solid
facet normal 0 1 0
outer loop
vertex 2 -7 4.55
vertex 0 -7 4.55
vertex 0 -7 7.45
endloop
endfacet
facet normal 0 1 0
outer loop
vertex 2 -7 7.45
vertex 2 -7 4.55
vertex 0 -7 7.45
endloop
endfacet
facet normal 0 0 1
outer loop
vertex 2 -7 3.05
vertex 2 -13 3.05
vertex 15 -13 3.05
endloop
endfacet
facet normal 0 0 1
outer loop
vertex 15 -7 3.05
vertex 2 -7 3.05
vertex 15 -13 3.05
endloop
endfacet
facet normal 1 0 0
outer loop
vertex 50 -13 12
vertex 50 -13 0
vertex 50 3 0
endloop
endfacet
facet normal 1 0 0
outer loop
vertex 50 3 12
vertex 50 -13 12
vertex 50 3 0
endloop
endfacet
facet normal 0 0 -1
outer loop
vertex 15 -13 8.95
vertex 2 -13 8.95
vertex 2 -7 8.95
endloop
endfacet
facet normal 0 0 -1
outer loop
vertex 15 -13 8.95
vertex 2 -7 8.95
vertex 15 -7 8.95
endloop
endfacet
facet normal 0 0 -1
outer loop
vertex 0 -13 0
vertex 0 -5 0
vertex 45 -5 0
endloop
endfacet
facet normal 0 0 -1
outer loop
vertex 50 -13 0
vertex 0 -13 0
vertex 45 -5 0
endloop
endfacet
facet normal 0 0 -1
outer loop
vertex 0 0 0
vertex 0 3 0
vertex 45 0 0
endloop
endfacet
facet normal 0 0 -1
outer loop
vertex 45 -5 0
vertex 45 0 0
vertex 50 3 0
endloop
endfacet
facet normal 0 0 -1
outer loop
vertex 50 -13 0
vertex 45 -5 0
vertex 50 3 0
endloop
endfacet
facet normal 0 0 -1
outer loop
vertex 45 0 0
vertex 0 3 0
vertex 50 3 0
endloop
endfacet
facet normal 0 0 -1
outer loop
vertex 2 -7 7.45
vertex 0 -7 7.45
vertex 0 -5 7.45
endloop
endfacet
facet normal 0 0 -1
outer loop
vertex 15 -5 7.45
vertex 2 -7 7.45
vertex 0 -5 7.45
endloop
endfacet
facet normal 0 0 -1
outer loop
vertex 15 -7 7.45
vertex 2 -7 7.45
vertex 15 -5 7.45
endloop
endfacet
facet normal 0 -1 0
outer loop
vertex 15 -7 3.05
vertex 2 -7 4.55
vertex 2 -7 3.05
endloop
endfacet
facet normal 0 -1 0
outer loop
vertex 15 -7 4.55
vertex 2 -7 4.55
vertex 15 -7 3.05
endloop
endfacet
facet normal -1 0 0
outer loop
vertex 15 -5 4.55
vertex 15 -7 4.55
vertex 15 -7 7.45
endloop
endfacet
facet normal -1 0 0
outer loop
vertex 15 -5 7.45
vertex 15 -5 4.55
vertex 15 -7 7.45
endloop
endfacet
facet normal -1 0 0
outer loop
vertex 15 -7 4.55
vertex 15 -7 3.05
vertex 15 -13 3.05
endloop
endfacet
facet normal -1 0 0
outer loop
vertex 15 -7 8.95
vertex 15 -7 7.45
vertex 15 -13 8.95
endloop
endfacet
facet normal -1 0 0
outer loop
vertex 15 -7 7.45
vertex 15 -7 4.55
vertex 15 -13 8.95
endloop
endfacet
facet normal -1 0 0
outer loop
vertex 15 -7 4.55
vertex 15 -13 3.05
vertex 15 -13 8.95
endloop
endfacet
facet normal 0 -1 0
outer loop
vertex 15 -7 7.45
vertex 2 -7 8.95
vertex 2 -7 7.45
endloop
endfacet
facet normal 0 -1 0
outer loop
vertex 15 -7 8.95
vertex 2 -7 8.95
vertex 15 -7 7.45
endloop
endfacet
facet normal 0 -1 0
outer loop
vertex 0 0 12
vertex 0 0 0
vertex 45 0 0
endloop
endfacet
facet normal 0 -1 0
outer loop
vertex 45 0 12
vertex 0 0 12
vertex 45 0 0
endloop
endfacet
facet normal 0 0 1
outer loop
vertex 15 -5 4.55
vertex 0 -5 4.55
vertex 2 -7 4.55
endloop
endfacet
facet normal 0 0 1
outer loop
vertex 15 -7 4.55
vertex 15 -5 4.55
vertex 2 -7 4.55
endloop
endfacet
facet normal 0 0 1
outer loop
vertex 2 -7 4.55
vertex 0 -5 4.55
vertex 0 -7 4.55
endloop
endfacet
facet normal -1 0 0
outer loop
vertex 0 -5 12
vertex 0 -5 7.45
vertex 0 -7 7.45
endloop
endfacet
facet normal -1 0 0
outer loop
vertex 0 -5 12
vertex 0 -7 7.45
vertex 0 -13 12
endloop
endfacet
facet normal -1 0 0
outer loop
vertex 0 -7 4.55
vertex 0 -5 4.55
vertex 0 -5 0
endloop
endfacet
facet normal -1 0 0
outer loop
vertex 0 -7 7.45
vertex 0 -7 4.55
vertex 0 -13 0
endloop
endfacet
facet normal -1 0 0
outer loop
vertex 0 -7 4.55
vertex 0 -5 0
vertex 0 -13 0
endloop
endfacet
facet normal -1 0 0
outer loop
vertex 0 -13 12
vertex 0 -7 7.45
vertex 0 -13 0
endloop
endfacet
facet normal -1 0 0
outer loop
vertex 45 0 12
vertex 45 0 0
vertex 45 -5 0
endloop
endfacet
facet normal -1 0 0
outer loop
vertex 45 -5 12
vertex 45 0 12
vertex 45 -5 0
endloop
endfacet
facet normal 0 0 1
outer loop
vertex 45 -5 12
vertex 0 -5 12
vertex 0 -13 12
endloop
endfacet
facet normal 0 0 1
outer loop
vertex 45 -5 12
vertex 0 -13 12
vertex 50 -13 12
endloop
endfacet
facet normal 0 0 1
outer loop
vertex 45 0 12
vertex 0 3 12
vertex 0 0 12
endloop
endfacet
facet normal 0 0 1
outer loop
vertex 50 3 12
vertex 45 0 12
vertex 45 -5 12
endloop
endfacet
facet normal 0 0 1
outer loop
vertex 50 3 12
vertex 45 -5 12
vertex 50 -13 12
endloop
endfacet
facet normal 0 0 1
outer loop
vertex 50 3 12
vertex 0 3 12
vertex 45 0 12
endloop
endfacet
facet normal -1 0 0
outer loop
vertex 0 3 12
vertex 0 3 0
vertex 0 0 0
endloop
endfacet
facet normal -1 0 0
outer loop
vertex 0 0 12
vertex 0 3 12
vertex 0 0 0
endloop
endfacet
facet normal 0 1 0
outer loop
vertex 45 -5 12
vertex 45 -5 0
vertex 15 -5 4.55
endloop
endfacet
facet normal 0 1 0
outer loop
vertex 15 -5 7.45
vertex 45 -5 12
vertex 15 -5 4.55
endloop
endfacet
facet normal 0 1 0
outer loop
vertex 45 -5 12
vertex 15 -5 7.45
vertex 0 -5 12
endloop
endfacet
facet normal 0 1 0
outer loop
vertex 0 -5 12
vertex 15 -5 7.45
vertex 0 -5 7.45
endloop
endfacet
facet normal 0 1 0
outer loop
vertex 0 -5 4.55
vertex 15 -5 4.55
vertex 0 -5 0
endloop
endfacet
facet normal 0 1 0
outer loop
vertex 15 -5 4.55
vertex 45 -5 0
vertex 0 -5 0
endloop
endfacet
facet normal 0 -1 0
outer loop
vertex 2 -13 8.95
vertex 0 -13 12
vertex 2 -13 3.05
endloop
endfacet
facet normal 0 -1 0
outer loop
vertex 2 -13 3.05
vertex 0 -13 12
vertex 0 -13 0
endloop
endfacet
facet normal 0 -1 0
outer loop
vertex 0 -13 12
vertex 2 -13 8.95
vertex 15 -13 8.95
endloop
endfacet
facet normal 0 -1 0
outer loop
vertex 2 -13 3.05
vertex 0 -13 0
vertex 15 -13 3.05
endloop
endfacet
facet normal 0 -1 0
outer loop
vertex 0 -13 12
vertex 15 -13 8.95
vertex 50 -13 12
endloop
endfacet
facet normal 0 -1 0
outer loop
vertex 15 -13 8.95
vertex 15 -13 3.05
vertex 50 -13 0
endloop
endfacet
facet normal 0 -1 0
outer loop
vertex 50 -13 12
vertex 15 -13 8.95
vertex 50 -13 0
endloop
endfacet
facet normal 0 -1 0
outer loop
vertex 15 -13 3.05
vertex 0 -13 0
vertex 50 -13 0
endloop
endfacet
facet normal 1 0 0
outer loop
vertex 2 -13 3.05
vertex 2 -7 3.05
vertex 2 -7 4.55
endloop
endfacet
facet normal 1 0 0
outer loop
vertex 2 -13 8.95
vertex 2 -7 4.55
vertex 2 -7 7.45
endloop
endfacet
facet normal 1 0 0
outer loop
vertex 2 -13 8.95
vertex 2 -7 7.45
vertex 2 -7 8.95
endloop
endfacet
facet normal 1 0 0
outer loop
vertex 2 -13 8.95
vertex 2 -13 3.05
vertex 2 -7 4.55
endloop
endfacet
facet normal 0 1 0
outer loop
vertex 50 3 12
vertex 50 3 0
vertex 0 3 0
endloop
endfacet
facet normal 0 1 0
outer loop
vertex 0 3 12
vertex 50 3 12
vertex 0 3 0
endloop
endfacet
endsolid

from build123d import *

# Parameters (mm, degrees)
F1_DEPTH = 12
F2_W     = 13
F2_H     = 5.9
F3_DEPTH = 6
F4_W     = 13
F4_H     = 2.9
F5_DEPTH = 2
F6_W     = 2
F6_H     = 2.9
F7_DEPTH = 2


with BuildPart() as f1:
    # F0 (on Top) → F1 (new body)
    with BuildSketch(Plane.XY):
        Polygon((0, 3), (0, 0), (45, 0), (45, -5), (0, -5), (0, -13), (50, -13), (50, 3), align=None)
    extrude(amount=F1_DEPTH)

    # F2 (on face) → F3 (cut)
    with BuildSketch(Plane.XZ.offset(13)):
        with Locations((8.5, 6)):
            Rectangle(F2_W, F2_H)
    extrude(amount=-F3_DEPTH, mode=Mode.SUBTRACT)

    # F4 (on face) → F5 (cut, through all)
    with BuildSketch(Plane.XZ.offset(7)):
        with Locations((8.5, 6)):
            Rectangle(F4_W, F4_H)
    extrude(amount=-F5_DEPTH, mode=Mode.SUBTRACT)

    # F6 (on face) → F7 (cut, through all)
    with BuildSketch(Plane(origin=(0, 0, 0), x_dir=(0, -1, 0), z_dir=(-1, 0, 0))):
        with Locations((6, 6)):
            Rectangle(F6_W, F6_H)
    extrude(amount=-F7_DEPTH, mode=Mode.SUBTRACT)


solid = f1.part
